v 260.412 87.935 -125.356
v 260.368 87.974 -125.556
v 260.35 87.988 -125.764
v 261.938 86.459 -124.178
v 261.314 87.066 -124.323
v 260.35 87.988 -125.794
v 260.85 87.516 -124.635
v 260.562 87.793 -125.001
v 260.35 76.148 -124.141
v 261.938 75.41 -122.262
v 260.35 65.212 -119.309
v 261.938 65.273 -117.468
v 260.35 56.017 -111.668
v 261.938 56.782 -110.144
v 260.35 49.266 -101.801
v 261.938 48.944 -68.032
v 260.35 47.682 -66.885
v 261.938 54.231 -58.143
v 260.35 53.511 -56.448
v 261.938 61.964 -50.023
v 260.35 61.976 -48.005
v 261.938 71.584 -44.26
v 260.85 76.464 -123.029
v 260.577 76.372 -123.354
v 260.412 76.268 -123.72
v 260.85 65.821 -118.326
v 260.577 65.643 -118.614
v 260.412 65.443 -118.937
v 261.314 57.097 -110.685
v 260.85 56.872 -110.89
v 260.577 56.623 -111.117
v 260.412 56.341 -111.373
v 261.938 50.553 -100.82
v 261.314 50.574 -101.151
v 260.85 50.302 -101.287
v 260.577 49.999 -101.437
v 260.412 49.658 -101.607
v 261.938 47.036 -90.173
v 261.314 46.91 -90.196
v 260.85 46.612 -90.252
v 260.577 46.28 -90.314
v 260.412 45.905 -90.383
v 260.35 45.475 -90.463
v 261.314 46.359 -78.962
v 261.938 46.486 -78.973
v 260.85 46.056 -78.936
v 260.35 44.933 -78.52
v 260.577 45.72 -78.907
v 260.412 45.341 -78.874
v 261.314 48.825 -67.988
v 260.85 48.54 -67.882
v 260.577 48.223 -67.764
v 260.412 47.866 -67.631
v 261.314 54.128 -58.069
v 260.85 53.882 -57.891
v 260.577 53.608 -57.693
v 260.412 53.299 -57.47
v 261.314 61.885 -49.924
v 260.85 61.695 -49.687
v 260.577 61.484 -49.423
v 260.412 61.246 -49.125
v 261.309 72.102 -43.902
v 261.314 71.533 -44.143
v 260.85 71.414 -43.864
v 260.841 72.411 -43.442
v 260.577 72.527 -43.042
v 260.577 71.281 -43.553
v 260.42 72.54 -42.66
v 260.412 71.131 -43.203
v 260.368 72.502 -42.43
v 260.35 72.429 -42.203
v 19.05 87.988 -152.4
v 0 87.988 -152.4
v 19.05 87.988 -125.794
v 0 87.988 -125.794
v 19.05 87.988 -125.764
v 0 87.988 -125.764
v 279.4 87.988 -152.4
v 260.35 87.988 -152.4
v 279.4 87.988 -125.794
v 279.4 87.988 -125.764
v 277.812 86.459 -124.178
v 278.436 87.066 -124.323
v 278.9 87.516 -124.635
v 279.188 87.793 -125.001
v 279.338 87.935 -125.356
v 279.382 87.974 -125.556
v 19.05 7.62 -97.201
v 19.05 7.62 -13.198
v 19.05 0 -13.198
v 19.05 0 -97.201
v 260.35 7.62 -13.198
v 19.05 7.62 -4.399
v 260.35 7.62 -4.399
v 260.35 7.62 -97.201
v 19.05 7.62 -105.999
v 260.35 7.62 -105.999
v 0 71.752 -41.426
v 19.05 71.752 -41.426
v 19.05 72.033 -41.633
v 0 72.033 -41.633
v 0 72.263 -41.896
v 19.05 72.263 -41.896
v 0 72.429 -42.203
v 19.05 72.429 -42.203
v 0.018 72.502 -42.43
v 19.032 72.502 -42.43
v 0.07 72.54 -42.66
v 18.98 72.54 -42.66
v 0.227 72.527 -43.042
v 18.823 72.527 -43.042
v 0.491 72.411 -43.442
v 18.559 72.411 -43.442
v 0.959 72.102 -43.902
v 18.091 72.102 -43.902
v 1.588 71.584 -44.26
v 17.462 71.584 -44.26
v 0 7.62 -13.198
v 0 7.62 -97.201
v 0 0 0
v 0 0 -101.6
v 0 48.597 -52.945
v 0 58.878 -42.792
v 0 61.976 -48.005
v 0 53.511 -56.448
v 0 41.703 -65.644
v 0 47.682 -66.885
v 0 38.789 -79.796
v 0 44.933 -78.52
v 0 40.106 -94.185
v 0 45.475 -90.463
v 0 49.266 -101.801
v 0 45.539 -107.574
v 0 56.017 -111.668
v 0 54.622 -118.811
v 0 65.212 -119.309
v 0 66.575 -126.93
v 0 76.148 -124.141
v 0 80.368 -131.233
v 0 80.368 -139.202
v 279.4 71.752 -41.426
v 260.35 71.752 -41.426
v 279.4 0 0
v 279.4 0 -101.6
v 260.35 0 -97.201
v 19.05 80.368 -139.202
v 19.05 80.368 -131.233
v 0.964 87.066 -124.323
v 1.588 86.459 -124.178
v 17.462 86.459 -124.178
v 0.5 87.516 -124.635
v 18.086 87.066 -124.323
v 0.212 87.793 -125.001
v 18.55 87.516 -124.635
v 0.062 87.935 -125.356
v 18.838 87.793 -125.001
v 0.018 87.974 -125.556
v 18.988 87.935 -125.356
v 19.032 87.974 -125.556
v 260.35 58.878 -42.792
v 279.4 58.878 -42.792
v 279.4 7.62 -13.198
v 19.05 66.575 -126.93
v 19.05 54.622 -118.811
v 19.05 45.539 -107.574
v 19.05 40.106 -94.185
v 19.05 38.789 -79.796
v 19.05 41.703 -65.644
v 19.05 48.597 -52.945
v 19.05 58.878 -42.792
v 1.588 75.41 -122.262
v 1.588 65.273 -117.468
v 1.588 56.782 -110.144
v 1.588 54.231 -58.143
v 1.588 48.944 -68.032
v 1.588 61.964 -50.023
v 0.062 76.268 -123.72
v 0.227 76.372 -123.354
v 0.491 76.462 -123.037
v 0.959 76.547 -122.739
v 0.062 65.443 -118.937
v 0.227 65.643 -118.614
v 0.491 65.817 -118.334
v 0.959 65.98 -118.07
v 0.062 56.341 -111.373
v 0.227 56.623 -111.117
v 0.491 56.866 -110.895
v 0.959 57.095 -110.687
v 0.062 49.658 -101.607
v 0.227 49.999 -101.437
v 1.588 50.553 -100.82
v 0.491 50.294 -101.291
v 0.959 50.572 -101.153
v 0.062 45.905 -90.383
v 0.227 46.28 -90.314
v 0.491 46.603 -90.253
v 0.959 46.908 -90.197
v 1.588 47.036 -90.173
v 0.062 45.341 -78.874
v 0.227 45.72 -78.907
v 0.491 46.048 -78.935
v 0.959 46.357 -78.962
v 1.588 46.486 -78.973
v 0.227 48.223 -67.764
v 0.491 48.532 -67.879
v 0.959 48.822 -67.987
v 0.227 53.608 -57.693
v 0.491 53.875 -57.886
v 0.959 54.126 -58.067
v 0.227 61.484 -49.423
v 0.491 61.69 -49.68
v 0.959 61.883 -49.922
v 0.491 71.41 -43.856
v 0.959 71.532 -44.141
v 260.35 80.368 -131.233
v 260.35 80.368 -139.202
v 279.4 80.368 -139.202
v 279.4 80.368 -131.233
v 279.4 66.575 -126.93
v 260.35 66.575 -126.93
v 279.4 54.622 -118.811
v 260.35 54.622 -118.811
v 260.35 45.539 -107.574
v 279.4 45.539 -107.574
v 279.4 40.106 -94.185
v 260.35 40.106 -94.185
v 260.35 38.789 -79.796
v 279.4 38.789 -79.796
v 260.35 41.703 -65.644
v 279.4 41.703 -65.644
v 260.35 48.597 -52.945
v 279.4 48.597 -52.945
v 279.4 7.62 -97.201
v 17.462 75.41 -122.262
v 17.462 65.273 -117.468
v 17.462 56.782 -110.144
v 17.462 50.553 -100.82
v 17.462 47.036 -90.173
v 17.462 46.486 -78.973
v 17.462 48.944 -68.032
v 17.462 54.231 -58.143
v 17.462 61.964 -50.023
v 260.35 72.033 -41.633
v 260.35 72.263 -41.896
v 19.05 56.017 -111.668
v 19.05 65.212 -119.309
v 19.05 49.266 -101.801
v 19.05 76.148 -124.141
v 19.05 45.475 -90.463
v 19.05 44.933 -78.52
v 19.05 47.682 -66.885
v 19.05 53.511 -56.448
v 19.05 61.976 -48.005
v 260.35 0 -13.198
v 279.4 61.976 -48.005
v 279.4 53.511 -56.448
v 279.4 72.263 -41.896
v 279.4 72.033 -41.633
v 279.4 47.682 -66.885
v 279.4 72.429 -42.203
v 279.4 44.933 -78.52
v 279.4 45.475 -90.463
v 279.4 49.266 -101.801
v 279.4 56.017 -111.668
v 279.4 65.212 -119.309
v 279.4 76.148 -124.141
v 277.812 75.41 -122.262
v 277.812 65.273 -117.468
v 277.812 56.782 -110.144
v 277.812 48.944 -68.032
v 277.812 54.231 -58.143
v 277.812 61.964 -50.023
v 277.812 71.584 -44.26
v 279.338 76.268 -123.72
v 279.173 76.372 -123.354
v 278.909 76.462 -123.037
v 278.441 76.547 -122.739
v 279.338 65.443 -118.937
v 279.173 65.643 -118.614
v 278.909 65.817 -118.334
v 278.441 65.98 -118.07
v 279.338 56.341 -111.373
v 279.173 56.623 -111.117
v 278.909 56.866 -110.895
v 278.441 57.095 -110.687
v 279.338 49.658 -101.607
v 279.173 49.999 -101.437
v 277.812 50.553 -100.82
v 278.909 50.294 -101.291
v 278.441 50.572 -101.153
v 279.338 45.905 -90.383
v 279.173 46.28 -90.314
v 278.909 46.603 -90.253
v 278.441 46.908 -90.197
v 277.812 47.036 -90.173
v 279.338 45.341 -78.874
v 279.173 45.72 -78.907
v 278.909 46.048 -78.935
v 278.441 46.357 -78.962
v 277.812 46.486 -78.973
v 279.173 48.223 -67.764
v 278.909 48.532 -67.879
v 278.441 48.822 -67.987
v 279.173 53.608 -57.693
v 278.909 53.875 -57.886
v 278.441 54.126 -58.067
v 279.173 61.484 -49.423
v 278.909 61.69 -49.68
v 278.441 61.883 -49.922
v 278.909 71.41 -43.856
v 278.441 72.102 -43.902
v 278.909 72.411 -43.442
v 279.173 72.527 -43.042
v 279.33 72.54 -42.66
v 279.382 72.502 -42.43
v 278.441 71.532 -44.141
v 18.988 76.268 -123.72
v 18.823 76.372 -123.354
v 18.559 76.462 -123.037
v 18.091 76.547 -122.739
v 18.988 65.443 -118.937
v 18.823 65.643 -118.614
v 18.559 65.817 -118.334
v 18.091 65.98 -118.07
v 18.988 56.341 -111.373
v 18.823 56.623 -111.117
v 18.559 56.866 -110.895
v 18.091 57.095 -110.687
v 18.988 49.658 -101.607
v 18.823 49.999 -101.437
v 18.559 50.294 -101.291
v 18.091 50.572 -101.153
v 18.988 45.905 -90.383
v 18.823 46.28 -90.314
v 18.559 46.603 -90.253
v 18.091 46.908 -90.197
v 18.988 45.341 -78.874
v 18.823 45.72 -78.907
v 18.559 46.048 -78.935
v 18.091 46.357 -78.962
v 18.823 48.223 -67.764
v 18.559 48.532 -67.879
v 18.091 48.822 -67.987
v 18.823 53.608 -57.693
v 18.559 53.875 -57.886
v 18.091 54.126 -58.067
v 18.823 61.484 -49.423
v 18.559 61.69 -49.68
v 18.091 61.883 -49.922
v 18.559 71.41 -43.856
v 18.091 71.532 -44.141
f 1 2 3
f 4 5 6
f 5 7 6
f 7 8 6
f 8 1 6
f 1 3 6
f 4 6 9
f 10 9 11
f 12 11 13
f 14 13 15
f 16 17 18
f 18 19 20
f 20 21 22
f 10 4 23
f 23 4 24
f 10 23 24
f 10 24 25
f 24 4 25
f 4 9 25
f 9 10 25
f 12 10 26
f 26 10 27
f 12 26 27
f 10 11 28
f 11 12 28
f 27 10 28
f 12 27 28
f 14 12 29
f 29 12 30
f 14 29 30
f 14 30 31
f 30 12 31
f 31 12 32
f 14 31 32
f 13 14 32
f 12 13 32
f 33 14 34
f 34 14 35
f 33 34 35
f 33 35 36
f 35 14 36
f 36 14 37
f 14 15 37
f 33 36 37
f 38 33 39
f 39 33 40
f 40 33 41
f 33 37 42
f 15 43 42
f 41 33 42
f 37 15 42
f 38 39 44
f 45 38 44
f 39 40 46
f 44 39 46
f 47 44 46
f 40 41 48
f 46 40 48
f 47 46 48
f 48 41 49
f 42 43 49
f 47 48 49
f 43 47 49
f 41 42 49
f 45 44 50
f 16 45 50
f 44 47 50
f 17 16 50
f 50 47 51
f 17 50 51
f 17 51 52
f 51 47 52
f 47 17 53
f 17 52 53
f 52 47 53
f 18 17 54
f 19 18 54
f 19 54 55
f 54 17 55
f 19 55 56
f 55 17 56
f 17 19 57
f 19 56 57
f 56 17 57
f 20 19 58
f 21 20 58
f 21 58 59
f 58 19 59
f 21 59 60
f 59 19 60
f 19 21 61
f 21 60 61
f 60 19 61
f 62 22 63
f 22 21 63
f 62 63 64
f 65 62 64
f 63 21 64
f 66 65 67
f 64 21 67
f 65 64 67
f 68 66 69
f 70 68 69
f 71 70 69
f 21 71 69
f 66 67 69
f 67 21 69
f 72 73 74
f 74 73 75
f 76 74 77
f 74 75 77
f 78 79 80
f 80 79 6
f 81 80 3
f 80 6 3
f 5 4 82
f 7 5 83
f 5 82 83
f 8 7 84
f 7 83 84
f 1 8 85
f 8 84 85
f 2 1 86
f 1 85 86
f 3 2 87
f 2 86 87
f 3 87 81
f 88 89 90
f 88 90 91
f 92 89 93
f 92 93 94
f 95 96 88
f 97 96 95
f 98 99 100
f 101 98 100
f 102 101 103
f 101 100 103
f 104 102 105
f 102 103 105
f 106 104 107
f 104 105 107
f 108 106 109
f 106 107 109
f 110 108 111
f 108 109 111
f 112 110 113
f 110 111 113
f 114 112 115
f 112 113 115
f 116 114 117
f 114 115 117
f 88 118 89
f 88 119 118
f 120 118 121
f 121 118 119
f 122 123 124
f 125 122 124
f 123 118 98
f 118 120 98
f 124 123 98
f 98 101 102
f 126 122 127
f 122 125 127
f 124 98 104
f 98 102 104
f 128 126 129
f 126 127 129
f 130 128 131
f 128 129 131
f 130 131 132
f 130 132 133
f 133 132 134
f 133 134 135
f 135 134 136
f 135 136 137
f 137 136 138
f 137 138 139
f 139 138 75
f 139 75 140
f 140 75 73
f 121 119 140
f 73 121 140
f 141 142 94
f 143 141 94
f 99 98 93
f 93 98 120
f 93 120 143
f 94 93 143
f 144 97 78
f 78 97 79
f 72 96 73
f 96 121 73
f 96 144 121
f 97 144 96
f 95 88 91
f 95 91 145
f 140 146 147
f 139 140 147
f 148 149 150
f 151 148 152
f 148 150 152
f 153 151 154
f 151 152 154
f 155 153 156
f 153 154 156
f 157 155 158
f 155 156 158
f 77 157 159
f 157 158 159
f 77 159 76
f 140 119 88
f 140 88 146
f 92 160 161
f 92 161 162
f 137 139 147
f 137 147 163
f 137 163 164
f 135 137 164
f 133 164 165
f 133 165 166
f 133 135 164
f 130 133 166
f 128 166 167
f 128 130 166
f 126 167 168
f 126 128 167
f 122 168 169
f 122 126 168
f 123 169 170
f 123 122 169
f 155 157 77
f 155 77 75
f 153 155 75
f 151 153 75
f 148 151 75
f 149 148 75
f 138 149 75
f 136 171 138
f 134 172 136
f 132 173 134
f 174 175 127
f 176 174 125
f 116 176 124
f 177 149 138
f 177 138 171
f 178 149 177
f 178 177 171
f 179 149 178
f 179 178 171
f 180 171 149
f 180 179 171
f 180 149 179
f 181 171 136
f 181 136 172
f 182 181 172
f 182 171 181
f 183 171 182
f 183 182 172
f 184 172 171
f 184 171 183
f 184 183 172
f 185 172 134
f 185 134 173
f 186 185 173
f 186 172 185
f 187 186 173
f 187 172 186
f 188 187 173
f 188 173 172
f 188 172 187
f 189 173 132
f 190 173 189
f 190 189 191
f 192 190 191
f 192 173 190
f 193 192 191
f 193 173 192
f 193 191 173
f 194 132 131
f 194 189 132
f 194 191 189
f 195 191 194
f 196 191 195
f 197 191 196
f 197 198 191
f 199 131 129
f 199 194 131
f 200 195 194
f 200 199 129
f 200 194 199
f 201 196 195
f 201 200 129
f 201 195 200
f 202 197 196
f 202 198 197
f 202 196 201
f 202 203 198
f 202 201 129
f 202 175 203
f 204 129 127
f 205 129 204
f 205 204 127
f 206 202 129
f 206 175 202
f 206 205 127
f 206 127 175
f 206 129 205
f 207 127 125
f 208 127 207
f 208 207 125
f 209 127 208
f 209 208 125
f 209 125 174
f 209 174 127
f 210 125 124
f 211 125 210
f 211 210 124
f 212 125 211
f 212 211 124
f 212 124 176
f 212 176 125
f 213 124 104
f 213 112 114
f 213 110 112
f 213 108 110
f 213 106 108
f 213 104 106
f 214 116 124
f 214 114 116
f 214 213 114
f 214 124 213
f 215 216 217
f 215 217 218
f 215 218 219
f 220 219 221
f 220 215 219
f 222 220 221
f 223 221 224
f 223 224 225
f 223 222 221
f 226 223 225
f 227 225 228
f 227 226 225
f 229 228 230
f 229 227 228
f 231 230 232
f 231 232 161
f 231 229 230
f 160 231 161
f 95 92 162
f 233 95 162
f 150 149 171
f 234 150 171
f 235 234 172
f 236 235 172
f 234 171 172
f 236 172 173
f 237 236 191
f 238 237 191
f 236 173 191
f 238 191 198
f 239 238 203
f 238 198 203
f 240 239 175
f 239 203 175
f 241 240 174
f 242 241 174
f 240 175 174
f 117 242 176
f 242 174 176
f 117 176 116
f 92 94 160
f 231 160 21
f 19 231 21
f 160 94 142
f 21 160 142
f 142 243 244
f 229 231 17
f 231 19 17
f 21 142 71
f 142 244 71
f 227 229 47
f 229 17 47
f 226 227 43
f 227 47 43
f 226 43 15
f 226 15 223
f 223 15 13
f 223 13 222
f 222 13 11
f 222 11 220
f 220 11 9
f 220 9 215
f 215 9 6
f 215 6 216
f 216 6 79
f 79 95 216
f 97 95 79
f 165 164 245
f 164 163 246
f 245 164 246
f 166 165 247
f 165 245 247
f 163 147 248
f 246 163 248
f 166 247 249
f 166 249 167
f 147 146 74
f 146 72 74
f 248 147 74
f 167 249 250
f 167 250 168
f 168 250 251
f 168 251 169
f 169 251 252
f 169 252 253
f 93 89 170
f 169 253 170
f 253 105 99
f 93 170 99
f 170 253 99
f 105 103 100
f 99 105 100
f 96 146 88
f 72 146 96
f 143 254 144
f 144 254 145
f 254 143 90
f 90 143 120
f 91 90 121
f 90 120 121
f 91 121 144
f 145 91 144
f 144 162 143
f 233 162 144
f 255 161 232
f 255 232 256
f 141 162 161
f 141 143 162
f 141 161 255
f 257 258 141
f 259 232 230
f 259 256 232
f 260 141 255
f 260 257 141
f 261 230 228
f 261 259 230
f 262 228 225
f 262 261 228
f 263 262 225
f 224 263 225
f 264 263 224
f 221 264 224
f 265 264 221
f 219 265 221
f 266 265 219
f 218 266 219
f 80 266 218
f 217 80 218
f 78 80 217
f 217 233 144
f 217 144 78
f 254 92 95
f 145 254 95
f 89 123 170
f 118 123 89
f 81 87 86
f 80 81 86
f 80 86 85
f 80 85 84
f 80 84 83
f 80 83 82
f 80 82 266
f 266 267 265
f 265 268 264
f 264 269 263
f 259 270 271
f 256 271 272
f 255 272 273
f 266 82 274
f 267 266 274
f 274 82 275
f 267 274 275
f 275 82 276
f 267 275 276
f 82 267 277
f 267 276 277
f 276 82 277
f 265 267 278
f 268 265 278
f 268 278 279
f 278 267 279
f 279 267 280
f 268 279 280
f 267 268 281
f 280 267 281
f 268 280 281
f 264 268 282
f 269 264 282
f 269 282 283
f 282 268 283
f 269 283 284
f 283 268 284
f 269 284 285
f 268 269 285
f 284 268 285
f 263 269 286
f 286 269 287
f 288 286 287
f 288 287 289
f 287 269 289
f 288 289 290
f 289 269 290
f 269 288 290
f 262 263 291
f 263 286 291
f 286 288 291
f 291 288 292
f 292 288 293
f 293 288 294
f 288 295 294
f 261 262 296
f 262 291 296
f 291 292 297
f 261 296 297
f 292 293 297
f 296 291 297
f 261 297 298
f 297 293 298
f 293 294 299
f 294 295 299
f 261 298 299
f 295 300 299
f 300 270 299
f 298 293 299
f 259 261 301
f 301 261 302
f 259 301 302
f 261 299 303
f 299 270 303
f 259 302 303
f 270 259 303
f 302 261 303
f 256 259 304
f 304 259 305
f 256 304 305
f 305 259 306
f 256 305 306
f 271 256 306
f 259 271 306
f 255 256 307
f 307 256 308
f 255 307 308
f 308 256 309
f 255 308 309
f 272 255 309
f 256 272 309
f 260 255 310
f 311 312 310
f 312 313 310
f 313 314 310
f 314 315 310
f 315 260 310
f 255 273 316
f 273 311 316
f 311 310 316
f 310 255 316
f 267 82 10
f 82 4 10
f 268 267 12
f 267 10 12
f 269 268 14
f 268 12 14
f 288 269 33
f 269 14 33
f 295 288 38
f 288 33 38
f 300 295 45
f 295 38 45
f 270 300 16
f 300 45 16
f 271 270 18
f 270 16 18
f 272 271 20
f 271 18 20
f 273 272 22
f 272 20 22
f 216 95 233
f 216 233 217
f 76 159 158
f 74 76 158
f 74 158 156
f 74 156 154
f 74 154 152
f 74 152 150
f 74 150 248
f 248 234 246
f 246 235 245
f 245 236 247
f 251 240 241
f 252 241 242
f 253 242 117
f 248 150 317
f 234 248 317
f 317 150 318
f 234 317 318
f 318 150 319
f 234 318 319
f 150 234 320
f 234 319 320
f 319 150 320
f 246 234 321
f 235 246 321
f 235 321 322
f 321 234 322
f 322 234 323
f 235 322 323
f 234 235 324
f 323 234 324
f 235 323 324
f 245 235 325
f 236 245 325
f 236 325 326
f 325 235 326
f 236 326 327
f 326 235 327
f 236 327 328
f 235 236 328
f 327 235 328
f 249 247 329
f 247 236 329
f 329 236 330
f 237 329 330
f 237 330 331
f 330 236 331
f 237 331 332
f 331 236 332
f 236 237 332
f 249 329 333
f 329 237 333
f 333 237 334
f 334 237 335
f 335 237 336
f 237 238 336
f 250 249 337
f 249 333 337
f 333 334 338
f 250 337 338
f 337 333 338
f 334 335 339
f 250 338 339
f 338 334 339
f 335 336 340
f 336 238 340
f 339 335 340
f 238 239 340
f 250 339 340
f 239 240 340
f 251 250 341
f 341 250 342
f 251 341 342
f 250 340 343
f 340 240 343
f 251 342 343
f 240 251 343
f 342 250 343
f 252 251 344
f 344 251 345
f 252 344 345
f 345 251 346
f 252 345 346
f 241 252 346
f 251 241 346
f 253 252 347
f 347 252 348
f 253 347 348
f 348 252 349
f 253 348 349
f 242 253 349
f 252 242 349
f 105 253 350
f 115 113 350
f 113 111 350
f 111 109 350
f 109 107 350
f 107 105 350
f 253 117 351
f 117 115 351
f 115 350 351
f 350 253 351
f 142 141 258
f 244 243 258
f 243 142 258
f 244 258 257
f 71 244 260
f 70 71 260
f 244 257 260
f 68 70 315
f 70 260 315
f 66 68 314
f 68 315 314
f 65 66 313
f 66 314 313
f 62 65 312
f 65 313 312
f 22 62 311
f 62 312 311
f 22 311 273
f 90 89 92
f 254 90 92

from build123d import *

# Parameters (mm, degrees)
BOSS_EXTRUDE1_DEPTH = 279.4
SKETCH2_W           = 241.3
SKETCH2_H           = 124.206
SKETCH2_H_2         = 28.194
CUT_EXTRUDE3_DEPTH  = 80.368181
FILLET1_R           = 1.5875
SKETCH4_W           = 241.3
SKETCH4_H           = 84.002363795
CUT_EXTRUDE5_DEPTH  = 7.62


with BuildPart() as part:
    # Sketch1 → Boss-Extrude1 (new body)
    with BuildSketch(Plane(origin=(0, 0, 0), x_dir=(0, 0, -1), z_dir=(1, 0, 0))):
        with BuildLine():
            Line((0, 0), (101.6, 0))
            Line((101.6, 0), (152.4, 87.988181024))
            Line((152.4, 87.988181024), (124.206, 87.988181024))
            ThreePointArc((124.206, 87.988181024), (89.315487923, 46.885255226), (43.091610276, 74.636858378))
            Line((43.091610276, 74.636858378), (0, 0))
        make_face()
        with BuildLine():
            Line((139.201772846, 80.368181024), (131.23325971, 80.368181024))
            ThreePointArc((131.23325971, 80.368181024), (94.185048049, 40.105513671), (42.791899046, 58.8777433))
            Line((42.791899046, 58.8777433), (13.198227154, 7.62))
            Line((13.198227154, 7.62), (97.200590949, 7.62))
            Line((97.200590949, 7.62), (139.201772846, 80.368181024))
        make_face(mode=Mode.SUBTRACT)
    extrude(amount=BOSS_EXTRUDE1_DEPTH)

    # Sketch2 → Cut-Extrude3 (cut)
    with BuildSketch(Plane(origin=(0, 87.988181024, 0), x_dir=(1, 0, 0), z_dir=(0, 1, 0))):
        with Locations((139.7, 62.103)):
            Rectangle(SKETCH2_W, SKETCH2_H)
        with Locations((139.7, 138.303)):
            Rectangle(SKETCH2_W, SKETCH2_H_2)
    extrude(amount=-CUT_EXTRUDE3_DEPTH, mode=Mode.SUBTRACT)

    # Fillet1
    fillet1_edges = [part.edges().sort_by_distance(p)[0] for p in [
        (279.4, 46.885255226, -89.315487923),
        (9.525, 74.636858378, -43.091610276),
        (9.525, 87.988181024, -124.206),
        (19.05, 46.885255226, -89.315487923),
        (260.35, 46.885255226, -89.315487923),
        (0, 46.885255226, -89.315487923),
        (269.875, 74.636858378, -43.091610276),
        (269.875, 87.988181024, -124.206),
    ]]
    fillet(fillet1_edges, radius=FILLET1_R)

    # Sketch4 → Cut-Extrude5 (cut)
    with BuildSketch(Plane(origin=(0, 7.62, 0), x_dir=(1, 0, 0), z_dir=(0, 1, 0))):
        with Locations((139.7, 55.199409051)):
            Rectangle(SKETCH4_W, SKETCH4_H)
    extrude(amount=-CUT_EXTRUDE5_DEPTH, mode=Mode.SUBTRACT)


solid = part.part
